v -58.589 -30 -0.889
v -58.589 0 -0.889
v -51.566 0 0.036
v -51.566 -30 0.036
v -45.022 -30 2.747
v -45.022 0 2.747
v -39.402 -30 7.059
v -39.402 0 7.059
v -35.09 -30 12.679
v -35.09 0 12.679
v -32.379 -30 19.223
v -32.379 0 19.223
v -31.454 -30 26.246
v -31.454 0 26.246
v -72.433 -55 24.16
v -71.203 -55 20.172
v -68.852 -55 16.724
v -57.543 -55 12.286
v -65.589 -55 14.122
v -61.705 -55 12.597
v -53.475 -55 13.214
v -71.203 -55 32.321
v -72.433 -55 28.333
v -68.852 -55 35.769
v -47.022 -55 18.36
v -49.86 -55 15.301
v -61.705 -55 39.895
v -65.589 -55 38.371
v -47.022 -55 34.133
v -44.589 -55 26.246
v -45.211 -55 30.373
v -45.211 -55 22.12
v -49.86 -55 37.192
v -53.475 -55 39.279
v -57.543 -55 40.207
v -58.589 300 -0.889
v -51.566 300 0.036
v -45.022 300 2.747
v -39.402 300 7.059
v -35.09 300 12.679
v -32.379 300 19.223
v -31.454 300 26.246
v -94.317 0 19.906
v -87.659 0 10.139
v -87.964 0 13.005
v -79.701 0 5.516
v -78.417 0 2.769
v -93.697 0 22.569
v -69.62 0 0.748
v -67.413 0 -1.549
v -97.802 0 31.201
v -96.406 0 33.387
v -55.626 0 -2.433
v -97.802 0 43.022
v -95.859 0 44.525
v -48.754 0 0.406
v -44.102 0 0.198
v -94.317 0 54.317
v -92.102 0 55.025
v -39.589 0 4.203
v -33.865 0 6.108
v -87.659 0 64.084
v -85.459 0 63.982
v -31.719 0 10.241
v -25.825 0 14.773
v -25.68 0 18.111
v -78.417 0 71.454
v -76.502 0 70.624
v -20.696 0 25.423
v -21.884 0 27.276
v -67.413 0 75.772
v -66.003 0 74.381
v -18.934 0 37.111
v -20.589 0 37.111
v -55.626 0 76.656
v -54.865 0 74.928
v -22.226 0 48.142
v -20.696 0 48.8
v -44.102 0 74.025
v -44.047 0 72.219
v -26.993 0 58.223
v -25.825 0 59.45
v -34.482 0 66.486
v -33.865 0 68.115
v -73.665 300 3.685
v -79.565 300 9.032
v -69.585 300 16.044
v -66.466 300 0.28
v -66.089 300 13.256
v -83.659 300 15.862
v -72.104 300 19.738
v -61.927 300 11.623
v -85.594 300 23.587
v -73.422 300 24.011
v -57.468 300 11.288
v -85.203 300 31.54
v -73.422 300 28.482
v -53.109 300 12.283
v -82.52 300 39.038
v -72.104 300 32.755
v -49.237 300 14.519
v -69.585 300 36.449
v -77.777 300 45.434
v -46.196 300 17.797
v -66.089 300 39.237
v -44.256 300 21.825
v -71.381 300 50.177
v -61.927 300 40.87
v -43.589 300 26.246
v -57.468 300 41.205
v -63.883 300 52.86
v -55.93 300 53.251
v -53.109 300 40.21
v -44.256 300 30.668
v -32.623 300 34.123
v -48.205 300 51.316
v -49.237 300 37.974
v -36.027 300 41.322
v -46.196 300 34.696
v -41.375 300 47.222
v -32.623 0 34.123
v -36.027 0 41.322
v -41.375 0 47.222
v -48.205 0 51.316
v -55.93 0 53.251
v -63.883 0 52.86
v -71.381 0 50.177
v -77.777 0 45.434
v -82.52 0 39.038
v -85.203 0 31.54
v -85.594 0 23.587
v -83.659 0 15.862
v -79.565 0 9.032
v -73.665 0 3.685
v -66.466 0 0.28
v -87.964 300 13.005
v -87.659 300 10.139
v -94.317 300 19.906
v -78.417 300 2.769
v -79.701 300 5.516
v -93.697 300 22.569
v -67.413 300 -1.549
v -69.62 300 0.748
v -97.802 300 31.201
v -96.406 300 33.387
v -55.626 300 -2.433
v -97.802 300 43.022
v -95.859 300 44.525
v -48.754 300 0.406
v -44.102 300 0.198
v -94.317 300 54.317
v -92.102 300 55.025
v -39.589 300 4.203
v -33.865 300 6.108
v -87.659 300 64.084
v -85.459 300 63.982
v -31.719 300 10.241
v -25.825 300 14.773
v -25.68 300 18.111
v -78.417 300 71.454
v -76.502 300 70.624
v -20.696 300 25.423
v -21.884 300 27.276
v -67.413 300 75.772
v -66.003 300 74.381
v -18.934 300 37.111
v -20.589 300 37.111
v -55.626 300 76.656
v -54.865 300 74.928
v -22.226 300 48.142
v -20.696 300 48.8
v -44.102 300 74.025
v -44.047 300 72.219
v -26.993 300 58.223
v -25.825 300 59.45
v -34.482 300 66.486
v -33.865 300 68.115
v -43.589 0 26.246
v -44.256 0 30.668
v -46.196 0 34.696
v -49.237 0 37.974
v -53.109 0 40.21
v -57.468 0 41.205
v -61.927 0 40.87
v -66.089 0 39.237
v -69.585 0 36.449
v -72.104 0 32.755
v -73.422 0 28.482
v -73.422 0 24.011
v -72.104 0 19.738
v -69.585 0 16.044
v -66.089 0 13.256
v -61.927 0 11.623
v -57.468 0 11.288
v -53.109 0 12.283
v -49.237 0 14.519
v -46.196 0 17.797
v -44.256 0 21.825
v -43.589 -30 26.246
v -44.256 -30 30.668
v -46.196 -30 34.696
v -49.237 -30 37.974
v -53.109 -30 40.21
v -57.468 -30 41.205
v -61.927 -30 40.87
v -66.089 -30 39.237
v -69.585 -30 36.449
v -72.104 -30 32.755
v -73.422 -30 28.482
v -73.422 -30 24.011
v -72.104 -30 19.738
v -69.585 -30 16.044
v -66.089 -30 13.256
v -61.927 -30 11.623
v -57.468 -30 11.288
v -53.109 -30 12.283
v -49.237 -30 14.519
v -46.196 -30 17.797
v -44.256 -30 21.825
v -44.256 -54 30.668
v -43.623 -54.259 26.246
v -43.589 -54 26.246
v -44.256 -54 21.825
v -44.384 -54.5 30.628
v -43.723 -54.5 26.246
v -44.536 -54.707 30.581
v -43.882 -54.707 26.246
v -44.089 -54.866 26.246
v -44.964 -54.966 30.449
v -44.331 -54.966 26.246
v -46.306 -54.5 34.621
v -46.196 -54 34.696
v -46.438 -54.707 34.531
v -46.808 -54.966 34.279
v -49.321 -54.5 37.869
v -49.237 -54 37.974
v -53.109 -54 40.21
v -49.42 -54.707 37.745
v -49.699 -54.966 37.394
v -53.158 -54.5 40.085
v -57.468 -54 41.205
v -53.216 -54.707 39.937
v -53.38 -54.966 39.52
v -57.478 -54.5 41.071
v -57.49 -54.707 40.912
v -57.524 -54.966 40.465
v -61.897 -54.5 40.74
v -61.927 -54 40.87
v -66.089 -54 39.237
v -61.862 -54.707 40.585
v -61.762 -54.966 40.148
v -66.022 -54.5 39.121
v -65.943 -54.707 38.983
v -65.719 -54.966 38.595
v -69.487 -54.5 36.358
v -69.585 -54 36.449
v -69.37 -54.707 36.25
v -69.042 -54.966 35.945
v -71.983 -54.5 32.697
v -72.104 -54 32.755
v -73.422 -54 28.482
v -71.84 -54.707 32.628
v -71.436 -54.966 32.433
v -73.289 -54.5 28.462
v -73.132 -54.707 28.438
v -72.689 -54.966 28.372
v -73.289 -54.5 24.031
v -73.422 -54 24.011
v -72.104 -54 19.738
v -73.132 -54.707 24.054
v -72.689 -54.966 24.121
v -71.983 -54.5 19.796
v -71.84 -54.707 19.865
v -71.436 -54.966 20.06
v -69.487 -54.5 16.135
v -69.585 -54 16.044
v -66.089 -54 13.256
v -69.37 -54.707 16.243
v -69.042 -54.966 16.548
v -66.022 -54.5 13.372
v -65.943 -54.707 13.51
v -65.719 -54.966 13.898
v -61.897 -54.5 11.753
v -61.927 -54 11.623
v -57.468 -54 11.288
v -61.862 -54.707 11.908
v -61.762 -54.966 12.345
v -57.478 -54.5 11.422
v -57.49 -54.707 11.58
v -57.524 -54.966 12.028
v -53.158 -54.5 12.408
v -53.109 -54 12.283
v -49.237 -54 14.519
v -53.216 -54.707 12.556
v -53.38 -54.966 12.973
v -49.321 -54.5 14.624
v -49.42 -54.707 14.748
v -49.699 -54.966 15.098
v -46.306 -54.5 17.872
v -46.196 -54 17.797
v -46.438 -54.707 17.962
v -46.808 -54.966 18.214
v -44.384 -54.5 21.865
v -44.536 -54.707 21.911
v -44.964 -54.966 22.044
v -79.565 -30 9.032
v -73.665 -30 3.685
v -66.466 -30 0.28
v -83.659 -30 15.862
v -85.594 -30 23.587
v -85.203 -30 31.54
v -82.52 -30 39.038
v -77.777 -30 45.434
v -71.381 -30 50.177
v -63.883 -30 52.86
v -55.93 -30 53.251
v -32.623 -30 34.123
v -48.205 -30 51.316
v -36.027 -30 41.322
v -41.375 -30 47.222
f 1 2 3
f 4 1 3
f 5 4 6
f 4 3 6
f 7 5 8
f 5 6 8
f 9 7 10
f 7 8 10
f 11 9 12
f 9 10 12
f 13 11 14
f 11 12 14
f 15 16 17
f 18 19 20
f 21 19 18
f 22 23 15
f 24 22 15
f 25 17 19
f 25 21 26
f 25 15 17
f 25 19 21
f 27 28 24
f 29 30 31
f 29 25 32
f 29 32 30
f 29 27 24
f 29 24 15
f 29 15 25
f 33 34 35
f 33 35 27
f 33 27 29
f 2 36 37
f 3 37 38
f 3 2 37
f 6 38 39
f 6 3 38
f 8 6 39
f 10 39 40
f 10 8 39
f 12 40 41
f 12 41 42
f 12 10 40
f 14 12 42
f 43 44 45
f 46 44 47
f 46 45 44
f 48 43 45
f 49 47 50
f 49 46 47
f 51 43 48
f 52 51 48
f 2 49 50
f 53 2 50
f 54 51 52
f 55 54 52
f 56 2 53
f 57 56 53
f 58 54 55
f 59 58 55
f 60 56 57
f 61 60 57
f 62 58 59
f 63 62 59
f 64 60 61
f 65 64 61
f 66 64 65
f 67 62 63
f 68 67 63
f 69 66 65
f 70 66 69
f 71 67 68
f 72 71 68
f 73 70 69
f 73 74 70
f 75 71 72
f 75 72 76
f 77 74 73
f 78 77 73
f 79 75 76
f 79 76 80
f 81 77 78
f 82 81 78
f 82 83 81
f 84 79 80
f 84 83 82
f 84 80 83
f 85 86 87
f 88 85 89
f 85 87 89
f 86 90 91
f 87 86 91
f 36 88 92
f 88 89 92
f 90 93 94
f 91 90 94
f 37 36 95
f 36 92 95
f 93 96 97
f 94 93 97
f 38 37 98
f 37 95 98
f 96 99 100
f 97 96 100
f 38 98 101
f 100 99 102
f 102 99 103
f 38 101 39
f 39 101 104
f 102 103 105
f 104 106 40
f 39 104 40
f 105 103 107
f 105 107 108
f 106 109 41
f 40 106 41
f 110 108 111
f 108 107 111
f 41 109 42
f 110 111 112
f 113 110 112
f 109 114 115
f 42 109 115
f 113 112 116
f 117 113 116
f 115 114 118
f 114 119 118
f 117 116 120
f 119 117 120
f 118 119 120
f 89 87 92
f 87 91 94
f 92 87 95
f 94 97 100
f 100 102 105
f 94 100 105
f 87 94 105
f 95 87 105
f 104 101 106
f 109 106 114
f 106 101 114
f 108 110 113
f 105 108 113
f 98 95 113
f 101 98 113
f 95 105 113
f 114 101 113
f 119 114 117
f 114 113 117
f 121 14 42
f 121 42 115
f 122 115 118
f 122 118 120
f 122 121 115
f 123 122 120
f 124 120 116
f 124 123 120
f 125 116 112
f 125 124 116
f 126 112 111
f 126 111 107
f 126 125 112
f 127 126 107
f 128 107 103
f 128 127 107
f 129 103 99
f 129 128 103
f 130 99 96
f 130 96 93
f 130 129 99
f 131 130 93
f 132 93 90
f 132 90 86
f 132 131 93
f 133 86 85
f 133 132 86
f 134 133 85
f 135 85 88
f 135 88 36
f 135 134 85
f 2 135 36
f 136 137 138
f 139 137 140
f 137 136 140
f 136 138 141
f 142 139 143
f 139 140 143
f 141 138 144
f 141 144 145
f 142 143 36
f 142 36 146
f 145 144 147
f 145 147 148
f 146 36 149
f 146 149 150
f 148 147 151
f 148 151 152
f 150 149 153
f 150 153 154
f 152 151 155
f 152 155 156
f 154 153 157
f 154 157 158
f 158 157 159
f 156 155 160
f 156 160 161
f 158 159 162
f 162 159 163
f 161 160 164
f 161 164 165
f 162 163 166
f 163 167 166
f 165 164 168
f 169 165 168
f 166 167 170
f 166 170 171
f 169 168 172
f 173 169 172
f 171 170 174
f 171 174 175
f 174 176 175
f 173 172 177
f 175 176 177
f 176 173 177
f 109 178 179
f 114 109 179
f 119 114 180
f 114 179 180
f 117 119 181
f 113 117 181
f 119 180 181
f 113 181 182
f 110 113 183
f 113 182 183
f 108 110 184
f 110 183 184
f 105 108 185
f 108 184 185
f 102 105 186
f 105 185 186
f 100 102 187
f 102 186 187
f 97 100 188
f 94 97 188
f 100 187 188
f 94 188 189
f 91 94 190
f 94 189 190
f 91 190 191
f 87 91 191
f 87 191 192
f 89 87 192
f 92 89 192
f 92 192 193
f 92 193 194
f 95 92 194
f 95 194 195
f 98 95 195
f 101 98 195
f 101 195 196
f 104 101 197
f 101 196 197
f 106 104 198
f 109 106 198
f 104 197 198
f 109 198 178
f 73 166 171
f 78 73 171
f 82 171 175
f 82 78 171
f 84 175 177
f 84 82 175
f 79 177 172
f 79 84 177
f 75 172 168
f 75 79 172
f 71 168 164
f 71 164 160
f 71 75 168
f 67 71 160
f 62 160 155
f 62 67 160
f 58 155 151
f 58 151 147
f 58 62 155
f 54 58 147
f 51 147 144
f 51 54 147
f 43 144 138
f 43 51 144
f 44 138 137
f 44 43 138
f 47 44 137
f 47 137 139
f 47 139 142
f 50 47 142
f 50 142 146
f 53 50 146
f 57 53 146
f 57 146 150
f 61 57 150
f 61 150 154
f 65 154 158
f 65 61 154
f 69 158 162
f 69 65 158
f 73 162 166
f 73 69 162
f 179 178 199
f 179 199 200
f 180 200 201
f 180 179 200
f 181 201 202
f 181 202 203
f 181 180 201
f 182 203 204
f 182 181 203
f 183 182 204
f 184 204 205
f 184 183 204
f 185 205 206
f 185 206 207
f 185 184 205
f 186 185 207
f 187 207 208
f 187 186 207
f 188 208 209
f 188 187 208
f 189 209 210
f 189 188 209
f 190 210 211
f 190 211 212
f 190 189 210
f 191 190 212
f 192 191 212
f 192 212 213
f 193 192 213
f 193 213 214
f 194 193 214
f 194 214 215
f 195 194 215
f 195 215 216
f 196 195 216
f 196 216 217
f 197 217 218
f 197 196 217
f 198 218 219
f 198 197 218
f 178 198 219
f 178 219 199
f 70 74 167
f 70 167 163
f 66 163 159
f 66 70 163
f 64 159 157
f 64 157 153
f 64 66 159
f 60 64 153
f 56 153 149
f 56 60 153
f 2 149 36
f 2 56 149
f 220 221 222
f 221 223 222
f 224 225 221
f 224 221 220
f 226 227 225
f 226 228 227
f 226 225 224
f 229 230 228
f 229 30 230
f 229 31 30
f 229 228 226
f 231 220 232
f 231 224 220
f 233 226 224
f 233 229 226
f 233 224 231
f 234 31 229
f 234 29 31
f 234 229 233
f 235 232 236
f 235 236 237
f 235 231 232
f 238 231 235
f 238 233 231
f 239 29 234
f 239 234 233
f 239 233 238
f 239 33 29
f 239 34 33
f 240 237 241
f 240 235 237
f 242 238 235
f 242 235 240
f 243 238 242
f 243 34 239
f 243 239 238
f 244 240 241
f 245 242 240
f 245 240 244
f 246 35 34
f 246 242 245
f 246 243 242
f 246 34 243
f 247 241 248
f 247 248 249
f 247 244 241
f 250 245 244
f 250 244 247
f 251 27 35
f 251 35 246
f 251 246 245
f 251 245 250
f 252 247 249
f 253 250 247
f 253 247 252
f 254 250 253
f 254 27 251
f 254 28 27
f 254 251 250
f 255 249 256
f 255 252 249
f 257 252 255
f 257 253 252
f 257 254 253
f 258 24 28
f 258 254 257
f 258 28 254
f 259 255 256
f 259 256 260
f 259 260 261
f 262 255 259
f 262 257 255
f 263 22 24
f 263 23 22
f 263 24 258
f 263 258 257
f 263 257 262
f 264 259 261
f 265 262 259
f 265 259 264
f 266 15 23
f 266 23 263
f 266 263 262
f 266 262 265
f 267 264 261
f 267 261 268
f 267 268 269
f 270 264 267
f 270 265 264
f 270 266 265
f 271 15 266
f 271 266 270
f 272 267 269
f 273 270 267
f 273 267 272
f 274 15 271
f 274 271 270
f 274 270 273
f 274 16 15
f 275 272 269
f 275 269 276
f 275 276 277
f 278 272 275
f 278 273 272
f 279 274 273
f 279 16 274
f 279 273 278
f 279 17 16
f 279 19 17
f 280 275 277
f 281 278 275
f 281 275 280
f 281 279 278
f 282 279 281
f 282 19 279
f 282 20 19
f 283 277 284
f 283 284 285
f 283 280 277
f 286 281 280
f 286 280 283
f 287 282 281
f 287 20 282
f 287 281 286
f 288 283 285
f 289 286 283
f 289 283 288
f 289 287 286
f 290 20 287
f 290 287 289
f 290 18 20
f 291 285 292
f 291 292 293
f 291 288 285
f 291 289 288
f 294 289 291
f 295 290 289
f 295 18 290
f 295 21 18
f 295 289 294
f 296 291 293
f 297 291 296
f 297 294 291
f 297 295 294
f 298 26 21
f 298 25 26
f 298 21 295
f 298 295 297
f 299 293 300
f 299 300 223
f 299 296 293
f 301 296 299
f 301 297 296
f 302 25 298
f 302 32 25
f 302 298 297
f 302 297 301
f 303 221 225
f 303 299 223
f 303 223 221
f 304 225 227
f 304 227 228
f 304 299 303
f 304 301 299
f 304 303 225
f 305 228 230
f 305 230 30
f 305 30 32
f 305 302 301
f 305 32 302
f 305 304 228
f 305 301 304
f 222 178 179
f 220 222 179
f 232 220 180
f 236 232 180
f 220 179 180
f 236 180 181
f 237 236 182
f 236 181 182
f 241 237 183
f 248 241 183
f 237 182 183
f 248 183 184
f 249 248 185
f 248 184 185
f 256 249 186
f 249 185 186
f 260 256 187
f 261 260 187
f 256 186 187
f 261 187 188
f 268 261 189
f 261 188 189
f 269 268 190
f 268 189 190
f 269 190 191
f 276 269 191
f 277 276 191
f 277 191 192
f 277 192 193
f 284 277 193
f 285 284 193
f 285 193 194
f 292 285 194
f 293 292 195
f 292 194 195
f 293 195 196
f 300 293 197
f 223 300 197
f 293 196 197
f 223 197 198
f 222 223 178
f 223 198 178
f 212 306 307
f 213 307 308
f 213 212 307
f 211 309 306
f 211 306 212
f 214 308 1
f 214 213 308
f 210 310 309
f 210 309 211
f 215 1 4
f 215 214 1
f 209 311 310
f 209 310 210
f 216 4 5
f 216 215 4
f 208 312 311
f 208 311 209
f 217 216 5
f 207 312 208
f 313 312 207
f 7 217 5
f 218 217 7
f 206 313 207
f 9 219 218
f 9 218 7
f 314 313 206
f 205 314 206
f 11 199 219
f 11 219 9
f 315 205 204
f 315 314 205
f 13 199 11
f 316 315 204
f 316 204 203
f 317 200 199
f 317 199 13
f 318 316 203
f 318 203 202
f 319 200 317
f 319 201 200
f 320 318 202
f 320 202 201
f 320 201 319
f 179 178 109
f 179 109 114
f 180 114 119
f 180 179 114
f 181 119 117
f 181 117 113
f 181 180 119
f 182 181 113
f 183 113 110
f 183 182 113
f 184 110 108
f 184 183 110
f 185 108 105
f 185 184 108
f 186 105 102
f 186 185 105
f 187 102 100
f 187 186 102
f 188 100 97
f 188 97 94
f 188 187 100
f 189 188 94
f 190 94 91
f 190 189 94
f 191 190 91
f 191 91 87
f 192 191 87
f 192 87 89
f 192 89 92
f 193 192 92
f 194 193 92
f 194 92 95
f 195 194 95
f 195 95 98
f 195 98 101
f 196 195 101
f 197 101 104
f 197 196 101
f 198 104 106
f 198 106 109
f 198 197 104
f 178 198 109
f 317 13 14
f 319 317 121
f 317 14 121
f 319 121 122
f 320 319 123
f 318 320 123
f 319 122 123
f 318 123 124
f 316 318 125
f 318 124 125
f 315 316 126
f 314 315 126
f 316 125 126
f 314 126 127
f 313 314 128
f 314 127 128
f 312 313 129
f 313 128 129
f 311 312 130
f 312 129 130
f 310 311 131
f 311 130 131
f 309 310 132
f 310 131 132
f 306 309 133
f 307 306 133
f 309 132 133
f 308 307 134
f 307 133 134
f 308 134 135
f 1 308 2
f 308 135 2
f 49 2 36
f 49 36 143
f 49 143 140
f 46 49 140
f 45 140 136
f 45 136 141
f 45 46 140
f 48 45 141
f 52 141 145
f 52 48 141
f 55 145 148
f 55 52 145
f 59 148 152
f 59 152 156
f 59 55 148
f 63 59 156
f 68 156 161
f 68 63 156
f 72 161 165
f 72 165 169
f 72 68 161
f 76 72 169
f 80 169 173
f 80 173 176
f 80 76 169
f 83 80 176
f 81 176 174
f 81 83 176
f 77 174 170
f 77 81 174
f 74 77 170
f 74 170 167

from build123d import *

# Parameters (mm, degrees)
F0_R          = 39.6551273515
F1_DEPTH      = 300
F0_R_2        = 15
F2_DEPTH      = 300
F2_DEPTH_BACK = 30
F3_DEPTH      = 300
F3_DEPTH_BACK = 55
F4_R          = 1


# Not quite as in the source:
# - a feature names something its author has since deleted; it is built from what else it names


with BuildPart() as f1:
    # F0 (on Front) → F1 (new body)
    with BuildSketch(Plane.XZ):
        with Locations((-58.5893206298, 37.1114652178)):
            Circle(F0_R)
        with BuildLine():
            ThreePointArc((-58.5893200762, -0.8885347822), (-85.4593785107, 63.9815227072), (-20.5893206298, 37.1114652178))
            ThreePointArc((-20.5893206298, 37.1114652178), (-31.719262749, 10.2414077285), (-58.5893200762, -0.8885347822))
        make_face(mode=Mode.SUBTRACT)
    extrude(amount=-F1_DEPTH)

    # F0 (on Front) → F2 (join, two sides)
    with BuildSketch(Plane.XZ) as f2_sk:
        with BuildLine():
            ThreePointArc((-31.4543206298, 26.2464652178), (-77.7766633331, 45.4338075296), (-58.5893200762, -0.8885347822))
            ThreePointArc((-58.5893200762, -0.8885347822), (-39.4019779266, 7.0591229061), (-31.4543206298, 26.2464652178))
        make_face()
        with Locations((-58.5893206298, 26.2464652178)):
            Circle(F0_R_2, mode=Mode.SUBTRACT)
    extrude(amount=-F2_DEPTH)
    extrude(f2_sk.sketch, amount=F2_DEPTH_BACK)


with BuildPart() as f3:
    # F0 (on Front) → F3 (new body, two sides)
    with BuildSketch(Plane.XZ) as f3_sk:
        with Locations((-58.5893206298, 26.2464652178)):
            Circle(F0_R_2)
    extrude(amount=-F3_DEPTH)
    extrude(f3_sk.sketch, amount=F3_DEPTH_BACK)

    # F4
    f4_edges = [f3.edges().sort_by_distance(p)[0] for p in [
        (-73.589321, -55, 26.246465),
    ]]
    fillet(f4_edges, radius=F4_R)


solid = Compound([f1.part, f3.part])
